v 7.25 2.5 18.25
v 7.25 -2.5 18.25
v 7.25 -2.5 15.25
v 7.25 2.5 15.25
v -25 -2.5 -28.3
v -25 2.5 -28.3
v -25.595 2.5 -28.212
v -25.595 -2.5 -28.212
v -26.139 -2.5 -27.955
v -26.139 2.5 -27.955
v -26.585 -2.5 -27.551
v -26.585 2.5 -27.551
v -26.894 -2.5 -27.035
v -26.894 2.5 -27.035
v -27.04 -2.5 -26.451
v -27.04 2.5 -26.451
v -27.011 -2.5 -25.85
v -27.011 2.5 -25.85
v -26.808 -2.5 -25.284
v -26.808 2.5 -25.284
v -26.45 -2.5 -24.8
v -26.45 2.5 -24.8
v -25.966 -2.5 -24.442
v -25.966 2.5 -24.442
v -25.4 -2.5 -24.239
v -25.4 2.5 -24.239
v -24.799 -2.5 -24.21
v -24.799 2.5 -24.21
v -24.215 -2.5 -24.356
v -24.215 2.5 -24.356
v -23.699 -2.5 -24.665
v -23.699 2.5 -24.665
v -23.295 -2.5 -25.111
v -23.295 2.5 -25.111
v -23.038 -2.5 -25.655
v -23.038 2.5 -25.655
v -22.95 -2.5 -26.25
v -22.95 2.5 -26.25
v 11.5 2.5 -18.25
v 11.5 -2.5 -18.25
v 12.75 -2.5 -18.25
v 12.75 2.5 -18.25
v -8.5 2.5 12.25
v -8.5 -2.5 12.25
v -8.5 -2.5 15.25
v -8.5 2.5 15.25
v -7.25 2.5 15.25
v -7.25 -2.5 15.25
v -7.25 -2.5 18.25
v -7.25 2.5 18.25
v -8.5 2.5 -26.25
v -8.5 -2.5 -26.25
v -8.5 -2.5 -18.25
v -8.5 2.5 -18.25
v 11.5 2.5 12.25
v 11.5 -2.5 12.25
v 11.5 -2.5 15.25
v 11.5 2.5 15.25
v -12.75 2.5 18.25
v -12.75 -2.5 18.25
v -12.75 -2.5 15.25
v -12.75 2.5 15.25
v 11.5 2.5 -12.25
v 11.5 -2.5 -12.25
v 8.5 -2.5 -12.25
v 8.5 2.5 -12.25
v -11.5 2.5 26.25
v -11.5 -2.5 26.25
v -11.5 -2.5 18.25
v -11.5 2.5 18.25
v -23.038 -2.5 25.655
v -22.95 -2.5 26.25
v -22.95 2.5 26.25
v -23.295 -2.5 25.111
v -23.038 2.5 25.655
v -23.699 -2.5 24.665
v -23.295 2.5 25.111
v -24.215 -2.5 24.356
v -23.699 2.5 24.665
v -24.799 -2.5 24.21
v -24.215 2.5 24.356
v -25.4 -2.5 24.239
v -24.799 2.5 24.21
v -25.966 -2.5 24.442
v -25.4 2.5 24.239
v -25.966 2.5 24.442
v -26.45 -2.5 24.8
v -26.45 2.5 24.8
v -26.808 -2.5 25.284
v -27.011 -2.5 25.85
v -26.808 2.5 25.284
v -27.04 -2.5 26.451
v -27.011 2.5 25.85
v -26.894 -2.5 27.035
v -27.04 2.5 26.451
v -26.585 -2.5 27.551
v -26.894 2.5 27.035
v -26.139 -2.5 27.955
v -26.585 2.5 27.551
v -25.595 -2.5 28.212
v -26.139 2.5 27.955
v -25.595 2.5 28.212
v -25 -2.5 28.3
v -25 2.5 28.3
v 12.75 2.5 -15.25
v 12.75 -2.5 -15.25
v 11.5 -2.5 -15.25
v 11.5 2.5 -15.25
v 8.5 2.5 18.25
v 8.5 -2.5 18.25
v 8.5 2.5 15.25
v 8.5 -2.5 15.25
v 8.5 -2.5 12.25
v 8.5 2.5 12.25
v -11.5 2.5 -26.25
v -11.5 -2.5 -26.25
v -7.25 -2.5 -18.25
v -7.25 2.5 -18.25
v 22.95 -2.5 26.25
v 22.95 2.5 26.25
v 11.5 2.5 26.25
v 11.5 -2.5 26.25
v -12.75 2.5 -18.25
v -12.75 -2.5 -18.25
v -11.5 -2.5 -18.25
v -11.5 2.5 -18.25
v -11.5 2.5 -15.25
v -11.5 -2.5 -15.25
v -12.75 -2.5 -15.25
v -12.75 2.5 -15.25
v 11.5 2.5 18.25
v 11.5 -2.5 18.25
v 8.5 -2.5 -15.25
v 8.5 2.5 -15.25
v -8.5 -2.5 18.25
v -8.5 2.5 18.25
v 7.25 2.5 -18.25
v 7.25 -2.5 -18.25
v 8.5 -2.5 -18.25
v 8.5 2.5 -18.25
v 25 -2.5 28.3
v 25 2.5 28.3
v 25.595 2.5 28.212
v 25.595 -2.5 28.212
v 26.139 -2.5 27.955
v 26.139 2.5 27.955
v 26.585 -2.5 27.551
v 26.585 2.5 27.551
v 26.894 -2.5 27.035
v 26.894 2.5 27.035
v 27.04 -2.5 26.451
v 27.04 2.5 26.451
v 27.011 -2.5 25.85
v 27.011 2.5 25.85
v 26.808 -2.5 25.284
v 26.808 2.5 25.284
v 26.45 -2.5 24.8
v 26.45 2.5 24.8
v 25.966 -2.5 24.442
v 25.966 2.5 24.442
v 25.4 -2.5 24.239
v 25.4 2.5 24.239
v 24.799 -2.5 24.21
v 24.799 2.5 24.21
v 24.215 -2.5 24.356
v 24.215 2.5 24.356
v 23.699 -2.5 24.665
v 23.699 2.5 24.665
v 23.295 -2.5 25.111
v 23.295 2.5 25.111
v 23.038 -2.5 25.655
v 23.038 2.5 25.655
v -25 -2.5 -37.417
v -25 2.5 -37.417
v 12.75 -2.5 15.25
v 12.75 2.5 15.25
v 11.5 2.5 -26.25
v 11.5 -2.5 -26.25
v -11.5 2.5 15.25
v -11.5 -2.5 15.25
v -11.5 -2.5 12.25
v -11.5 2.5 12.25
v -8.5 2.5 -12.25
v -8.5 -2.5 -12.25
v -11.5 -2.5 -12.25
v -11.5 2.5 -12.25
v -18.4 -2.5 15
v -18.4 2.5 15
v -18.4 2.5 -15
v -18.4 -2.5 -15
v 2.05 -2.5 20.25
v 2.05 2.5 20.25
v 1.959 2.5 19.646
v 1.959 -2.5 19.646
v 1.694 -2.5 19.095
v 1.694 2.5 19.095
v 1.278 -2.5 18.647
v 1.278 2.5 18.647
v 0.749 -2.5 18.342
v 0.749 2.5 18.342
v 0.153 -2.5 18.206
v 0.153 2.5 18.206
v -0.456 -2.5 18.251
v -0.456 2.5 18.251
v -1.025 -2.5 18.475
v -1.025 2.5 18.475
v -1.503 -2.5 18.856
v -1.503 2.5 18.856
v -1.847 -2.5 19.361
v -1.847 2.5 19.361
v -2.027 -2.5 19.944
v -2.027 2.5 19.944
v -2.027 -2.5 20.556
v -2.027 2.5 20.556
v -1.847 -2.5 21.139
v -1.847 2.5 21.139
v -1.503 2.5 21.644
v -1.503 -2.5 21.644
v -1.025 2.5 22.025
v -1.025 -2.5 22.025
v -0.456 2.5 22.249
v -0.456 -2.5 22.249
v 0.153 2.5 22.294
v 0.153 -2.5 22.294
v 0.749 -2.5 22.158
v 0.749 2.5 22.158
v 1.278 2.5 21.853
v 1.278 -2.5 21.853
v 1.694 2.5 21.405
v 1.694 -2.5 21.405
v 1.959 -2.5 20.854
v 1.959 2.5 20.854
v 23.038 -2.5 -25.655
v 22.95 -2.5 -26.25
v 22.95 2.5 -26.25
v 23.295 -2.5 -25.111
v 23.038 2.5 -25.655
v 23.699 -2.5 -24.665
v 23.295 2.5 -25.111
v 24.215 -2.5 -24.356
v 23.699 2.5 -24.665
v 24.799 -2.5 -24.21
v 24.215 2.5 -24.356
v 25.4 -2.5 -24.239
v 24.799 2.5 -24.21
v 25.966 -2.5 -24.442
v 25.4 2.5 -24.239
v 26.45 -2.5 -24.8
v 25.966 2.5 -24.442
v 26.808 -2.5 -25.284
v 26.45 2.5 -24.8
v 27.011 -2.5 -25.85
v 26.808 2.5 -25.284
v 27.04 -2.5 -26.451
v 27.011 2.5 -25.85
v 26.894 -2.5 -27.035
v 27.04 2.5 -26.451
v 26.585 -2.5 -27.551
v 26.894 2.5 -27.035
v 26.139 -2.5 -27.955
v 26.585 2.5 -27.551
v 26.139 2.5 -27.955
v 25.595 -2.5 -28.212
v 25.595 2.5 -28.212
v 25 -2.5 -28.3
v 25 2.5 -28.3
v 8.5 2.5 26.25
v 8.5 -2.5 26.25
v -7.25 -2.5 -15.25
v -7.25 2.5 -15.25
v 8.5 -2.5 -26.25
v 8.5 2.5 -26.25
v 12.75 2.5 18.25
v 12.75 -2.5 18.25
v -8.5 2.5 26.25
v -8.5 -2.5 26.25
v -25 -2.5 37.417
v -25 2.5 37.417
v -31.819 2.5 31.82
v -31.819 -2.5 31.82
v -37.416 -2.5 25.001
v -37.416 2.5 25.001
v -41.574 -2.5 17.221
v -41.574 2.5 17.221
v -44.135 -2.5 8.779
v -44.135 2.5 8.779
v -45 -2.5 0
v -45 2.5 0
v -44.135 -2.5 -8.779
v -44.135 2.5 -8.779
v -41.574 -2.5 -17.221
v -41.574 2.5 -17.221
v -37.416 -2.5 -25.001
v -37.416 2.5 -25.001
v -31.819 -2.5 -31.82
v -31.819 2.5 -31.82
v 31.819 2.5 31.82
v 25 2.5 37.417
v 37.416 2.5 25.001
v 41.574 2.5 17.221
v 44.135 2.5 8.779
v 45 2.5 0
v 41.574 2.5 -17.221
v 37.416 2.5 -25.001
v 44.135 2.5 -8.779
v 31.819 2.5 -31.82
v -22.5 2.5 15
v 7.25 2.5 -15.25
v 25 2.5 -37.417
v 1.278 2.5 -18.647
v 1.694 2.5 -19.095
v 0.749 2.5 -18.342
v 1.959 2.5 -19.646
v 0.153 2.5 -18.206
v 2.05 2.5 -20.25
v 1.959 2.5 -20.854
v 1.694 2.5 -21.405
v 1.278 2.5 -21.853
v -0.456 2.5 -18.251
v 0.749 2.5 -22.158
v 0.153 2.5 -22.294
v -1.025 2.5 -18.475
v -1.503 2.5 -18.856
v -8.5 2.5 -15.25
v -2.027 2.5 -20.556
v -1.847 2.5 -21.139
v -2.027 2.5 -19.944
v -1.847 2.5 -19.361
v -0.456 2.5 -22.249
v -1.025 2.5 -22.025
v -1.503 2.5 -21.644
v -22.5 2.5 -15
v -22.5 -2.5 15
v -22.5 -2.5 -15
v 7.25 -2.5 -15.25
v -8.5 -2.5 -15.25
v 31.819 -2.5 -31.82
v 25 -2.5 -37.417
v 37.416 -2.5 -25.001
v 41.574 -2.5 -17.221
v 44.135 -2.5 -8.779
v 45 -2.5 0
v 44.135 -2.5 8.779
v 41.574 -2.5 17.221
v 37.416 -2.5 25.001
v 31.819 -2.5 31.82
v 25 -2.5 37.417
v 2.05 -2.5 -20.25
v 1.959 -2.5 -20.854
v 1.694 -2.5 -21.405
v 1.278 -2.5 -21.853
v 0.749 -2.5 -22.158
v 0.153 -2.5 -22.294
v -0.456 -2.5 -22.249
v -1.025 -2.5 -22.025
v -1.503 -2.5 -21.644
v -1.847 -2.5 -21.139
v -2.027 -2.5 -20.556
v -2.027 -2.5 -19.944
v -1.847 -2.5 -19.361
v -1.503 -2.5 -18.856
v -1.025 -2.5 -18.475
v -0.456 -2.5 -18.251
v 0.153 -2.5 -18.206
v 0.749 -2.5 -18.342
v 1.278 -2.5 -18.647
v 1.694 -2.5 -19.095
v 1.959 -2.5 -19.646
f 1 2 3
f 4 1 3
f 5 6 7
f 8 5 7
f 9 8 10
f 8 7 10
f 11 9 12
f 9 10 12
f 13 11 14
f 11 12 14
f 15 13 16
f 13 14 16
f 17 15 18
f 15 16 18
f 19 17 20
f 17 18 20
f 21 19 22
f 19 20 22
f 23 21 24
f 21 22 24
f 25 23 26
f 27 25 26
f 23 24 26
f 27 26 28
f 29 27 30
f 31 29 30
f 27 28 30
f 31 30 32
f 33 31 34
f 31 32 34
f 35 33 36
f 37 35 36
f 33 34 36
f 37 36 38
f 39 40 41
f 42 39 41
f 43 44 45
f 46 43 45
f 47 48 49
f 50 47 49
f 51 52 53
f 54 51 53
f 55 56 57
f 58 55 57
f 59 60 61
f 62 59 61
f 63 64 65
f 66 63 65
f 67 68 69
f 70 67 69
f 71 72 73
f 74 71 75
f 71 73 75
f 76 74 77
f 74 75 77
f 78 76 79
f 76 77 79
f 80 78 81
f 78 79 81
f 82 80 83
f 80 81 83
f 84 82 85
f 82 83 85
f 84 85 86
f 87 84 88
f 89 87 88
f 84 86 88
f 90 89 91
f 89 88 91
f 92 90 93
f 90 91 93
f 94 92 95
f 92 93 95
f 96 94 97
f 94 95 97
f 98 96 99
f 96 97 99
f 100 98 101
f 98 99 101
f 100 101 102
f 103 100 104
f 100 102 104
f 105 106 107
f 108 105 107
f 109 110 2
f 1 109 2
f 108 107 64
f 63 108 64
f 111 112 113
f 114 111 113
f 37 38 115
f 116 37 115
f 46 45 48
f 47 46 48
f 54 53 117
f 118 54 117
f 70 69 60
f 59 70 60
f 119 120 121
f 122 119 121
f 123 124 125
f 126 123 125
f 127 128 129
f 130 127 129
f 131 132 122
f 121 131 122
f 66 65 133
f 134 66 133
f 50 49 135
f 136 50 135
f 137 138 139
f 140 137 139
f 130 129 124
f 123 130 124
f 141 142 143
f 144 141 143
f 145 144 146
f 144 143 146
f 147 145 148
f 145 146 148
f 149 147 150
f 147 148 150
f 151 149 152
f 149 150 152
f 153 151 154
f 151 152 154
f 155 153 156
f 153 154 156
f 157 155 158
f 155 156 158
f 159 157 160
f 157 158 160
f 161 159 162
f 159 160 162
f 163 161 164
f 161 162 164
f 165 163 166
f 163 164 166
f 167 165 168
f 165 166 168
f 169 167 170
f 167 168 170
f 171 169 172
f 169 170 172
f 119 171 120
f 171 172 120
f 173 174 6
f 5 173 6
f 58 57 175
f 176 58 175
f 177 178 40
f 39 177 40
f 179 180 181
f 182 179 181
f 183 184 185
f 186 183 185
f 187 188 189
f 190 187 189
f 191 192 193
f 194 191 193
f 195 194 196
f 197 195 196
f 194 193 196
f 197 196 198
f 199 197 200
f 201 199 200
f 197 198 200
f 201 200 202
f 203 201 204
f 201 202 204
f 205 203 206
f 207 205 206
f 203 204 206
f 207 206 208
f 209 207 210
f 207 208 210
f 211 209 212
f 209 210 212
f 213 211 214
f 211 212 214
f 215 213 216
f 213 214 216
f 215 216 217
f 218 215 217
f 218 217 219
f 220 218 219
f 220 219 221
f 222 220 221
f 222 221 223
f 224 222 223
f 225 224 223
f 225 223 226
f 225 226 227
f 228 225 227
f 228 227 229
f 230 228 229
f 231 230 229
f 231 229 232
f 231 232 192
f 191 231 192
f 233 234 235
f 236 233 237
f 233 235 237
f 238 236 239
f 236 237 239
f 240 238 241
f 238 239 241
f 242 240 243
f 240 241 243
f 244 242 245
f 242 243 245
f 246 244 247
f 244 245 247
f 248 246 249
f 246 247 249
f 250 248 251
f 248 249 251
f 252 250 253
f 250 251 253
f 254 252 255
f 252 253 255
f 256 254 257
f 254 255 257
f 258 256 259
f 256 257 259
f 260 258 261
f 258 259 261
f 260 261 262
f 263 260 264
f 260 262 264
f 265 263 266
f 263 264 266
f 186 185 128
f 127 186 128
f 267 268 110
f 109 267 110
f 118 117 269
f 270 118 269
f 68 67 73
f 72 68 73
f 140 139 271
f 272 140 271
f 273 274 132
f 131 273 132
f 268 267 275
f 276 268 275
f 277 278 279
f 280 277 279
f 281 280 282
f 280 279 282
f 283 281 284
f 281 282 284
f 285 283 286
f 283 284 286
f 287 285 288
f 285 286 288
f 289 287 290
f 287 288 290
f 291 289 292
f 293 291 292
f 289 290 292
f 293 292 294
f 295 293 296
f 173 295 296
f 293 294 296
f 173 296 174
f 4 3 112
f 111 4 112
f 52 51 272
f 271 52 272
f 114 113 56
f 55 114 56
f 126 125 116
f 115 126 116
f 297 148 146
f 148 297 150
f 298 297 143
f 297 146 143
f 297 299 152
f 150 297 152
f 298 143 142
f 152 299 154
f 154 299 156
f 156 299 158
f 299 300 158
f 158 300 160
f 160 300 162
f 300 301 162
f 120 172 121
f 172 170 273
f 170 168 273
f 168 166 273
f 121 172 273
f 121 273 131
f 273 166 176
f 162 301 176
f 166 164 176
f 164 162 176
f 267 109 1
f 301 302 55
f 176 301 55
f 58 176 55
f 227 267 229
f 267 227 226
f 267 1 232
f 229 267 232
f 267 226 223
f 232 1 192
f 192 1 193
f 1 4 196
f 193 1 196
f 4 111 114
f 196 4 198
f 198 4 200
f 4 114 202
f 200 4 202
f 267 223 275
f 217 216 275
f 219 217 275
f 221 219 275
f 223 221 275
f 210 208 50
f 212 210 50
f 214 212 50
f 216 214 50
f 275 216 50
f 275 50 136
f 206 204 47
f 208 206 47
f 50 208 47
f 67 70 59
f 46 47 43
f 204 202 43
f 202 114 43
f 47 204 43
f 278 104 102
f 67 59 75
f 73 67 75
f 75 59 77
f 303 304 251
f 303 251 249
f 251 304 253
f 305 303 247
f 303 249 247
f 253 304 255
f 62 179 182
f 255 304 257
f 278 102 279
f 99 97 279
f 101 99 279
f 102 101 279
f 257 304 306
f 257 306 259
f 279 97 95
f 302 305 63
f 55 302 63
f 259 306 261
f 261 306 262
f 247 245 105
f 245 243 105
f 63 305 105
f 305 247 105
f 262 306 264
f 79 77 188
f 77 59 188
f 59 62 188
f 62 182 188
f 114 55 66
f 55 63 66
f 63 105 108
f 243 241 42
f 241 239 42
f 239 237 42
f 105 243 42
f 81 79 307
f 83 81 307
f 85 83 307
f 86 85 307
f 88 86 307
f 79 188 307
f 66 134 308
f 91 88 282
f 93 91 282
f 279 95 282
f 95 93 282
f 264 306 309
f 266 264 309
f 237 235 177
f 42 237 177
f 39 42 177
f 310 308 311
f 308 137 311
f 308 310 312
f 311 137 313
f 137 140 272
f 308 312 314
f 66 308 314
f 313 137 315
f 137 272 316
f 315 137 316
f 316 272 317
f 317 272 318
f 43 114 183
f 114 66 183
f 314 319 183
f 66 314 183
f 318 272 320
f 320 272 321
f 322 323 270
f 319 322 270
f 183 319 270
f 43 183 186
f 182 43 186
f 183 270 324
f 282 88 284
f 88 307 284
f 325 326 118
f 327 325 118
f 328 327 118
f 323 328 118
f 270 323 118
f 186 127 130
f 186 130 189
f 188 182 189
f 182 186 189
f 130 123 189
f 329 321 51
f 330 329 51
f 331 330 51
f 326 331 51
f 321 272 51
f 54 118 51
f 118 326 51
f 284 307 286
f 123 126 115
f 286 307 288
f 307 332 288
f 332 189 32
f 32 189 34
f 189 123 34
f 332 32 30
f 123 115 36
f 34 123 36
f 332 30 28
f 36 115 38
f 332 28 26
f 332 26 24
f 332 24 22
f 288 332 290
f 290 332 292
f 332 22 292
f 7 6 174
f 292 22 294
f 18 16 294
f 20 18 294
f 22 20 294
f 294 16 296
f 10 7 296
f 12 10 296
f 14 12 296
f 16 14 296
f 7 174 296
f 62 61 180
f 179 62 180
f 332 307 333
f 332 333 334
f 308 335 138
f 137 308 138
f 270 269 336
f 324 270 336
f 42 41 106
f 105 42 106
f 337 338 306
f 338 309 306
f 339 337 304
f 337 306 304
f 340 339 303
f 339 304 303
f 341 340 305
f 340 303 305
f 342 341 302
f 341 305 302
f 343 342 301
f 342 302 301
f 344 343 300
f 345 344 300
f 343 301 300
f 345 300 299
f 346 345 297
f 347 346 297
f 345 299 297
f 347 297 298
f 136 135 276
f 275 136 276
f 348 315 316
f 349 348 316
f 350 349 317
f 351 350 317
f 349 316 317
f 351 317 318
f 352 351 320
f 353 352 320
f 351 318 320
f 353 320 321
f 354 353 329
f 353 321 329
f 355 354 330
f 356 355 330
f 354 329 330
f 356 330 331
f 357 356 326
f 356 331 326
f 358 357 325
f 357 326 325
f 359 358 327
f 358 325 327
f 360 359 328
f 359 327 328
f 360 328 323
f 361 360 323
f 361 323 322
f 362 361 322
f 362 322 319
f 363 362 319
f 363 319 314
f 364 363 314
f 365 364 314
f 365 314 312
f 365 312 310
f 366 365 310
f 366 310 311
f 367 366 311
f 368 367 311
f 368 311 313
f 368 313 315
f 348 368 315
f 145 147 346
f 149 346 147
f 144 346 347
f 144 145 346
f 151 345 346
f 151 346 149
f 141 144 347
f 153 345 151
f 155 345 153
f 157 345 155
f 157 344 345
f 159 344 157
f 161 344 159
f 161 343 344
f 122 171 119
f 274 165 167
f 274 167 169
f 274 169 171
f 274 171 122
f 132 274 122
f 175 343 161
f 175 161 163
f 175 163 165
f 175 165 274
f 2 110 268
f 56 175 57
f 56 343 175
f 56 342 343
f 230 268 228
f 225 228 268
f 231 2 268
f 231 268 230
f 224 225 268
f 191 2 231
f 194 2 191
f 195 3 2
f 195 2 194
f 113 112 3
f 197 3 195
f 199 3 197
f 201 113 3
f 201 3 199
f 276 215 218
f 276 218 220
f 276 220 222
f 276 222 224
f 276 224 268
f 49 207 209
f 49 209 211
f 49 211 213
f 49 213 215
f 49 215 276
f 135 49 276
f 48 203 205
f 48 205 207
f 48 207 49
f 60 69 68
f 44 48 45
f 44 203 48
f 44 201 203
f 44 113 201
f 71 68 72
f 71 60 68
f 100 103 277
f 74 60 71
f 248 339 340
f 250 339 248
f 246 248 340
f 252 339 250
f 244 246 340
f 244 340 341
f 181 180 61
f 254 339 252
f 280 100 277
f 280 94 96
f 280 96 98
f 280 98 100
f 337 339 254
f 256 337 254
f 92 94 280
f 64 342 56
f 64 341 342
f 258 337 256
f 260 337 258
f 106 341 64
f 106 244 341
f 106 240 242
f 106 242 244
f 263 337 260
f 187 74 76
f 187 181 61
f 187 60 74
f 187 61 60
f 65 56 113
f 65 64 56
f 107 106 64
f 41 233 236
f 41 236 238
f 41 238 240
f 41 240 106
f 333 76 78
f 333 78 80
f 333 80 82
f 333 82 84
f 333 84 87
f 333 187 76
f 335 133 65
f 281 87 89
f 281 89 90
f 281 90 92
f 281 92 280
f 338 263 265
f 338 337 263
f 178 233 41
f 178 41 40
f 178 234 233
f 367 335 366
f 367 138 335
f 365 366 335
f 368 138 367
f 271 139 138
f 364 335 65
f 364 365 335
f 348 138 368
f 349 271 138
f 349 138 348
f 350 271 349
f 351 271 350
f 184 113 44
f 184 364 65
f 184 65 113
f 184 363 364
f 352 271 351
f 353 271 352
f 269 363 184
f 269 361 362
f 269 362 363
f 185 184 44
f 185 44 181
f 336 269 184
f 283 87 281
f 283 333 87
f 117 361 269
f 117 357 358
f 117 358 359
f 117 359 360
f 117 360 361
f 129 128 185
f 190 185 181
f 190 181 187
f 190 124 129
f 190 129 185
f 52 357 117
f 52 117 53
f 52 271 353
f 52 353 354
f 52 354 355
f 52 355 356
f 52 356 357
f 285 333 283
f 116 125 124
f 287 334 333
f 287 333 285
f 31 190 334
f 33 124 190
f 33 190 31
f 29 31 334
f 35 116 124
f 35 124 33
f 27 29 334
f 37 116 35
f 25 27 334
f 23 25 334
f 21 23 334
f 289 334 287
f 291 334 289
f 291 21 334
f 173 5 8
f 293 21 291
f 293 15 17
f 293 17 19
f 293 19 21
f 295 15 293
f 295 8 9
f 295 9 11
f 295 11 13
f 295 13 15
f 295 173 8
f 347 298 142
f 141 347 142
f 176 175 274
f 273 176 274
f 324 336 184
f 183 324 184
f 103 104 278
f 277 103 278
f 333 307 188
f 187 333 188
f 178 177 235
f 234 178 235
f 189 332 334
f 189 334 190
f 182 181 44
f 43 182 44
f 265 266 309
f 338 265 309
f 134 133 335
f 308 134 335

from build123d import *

# Parameters (mm, degrees)
ESTRUSIONE_ESTRUSIONE1_DEPTH = 2.5
CORTAR_EXTRUIR4_DEPTH        = 10
CROQUIS2_R                   = 2.05
CORTAR_EXTRUIR5_DEPTH        = 6
CUT_EXTRUDE1_REACH           = 7
SKETCH3_W                    = 4.1
SKETCH3_H                    = 30
CUT_EXTRUDE2_REACH           = 7
SKETCH4_R                    = 2.05


with BuildPart() as part:
    # Schizzo1 → Estrusione-Estrusione1 (new body, symmetric)
    with BuildSketch(Plane(origin=(0, 0, 0), x_dir=(1, 0, 0), z_dir=(0, 1, 0))):
        with BuildLine():
            Line((-25, 37.416573868), (-25, 26.25))
            Line((-25, 26.25), (25, 26.25))
            Line((25, 26.25), (25, 37.416573868))
            ThreePointArc((25, 37.416573868), (45, 0), (25, -37.416573868))
            Line((25, -37.416573868), (25, -26.25))
            Line((25, -26.25), (-25, -26.25))
            Line((-25, -26.25), (-25, -37.416573868))
            ThreePointArc((-25, -37.416573868), (-45, 0), (-25, 37.416573868))
        make_face()
    extrude(amount=ESTRUSIONE_ESTRUSIONE1_DEPTH, both=True)

    # Croquis1 → Cortar-Extruir4 (cut)
    with BuildSketch(Plane.XZ.offset(2.5)):
        Polygon((-8.5, 26.25), (-11.5, 26.25), (-11.5, 18.25), (-12.75, 18.25), (-12.75, 15.25), (-11.5, 15.25), (-11.5, 12.25), (-8.5, 12.25), (-8.5, 15.25), (-7.25, 15.25), (-7.25, 18.25), (-8.5, 18.25), align=None)
        Polygon((11.5, 26.25), (8.5, 26.25), (8.5, 18.25), (7.25, 18.25), (7.25, 15.25), (8.5, 15.25), (8.5, 12.25), (11.5, 12.25), (11.5, 15.25), (12.75, 15.25), (12.75, 18.25), (11.5, 18.25), align=None)
        Polygon((8.5, -12.25), (8.5, -15.25), (7.25, -15.25), (7.25, -18.25), (8.5, -18.25), (8.5, -26.25), (11.5, -26.25), (11.5, -18.25), (12.75, -18.25), (12.75, -15.25), (11.5, -15.25), (11.5, -12.25), align=None)
        Polygon((-11.5, -12.25), (-11.5, -15.25), (-12.75, -15.25), (-12.75, -18.25), (-11.5, -18.25), (-11.5, -26.25), (-8.5, -26.25), (-8.5, -18.25), (-7.25, -18.25), (-7.25, -15.25), (-8.5, -15.25), (-8.5, -12.25), align=None)
    extrude(amount=-CORTAR_EXTRUIR4_DEPTH, mode=Mode.SUBTRACT)

    # Croquis2 → Cortar-Extruir5 (cut, through all)
    with BuildSketch(Plane(origin=(0, 2.5, 0), x_dir=(1, 0, 0), z_dir=(0, 1, 0))):
        with Locations((0, 20.25)):
            Circle(CROQUIS2_R)
        with Locations((0, -20.25)):
            Circle(CROQUIS2_R)
    extrude(amount=-CORTAR_EXTRUIR5_DEPTH, mode=Mode.SUBTRACT)

    # Sketch3 → Cut-Extrude1 (cut, up to next)
    with BuildSketch(Plane(origin=(0, 2.5, 0), x_dir=(1, 0, 0), z_dir=(0, 1, 0)), mode=Mode.PRIVATE) as cut_extrude1_sk1:
        with Locations((-20.45, 0)):
            Rectangle(SKETCH3_W, SKETCH3_H)
    cut_extrude1_tool1 = extrude(cut_extrude1_sk1.sketch, amount=-CUT_EXTRUDE1_REACH, mode=Mode.PRIVATE) & part.part
    add(cut_extrude1_tool1.solids().sort_by_distance((-20.45, 2.5, 0))[0], mode=Mode.SUBTRACT)

    # Sketch4 → Cut-Extrude2 (cut, up to next)
    with BuildSketch(Plane(origin=(0, 2.5, 0), x_dir=(1, 0, 0), z_dir=(0, 1, 0)), mode=Mode.PRIVATE) as cut_extrude2_sk1:
        with Locations((-25, 26.25)):
            Circle(SKETCH4_R)
    cut_extrude2_tool1 = extrude(cut_extrude2_sk1.sketch, amount=-CUT_EXTRUDE2_REACH, mode=Mode.PRIVATE) & part.part
    add(cut_extrude2_tool1.solids().sort_by_distance((-25, 2.5, -26.25))[0], mode=Mode.SUBTRACT)
    # Sketch4 → Cut-Extrude2 (cut, up to next)
    with BuildSketch(Plane(origin=(0, 2.5, 0), x_dir=(1, 0, 0), z_dir=(0, 1, 0)), mode=Mode.PRIVATE) as cut_extrude2_sk2:
        with Locations((-25, -26.25)):
            Circle(SKETCH4_R)
    cut_extrude2_tool2 = extrude(cut_extrude2_sk2.sketch, amount=-CUT_EXTRUDE2_REACH, mode=Mode.PRIVATE) & part.part
    add(cut_extrude2_tool2.solids().sort_by_distance((-25, 2.5, 26.25))[0], mode=Mode.SUBTRACT)
    # Sketch4 → Cut-Extrude2 (cut, up to next)
    with BuildSketch(Plane(origin=(0, 2.5, 0), x_dir=(1, 0, 0), z_dir=(0, 1, 0)), mode=Mode.PRIVATE) as cut_extrude2_sk3:
        with Locations((25, -26.25)):
            Circle(SKETCH4_R)
    cut_extrude2_tool3 = extrude(cut_extrude2_sk3.sketch, amount=-CUT_EXTRUDE2_REACH, mode=Mode.PRIVATE) & part.part
    add(cut_extrude2_tool3.solids().sort_by_distance((25, 2.5, 26.25))[0], mode=Mode.SUBTRACT)
    # Sketch4 → Cut-Extrude2 (cut, up to next)
    with BuildSketch(Plane(origin=(0, 2.5, 0), x_dir=(1, 0, 0), z_dir=(0, 1, 0)), mode=Mode.PRIVATE) as cut_extrude2_sk4:
        with Locations((25, 26.25)):
            Circle(SKETCH4_R)
    cut_extrude2_tool4 = extrude(cut_extrude2_sk4.sketch, amount=-CUT_EXTRUDE2_REACH, mode=Mode.PRIVATE) & part.part
    add(cut_extrude2_tool4.solids().sort_by_distance((25, 2.5, -26.25))[0], mode=Mode.SUBTRACT)


solid = part.part
